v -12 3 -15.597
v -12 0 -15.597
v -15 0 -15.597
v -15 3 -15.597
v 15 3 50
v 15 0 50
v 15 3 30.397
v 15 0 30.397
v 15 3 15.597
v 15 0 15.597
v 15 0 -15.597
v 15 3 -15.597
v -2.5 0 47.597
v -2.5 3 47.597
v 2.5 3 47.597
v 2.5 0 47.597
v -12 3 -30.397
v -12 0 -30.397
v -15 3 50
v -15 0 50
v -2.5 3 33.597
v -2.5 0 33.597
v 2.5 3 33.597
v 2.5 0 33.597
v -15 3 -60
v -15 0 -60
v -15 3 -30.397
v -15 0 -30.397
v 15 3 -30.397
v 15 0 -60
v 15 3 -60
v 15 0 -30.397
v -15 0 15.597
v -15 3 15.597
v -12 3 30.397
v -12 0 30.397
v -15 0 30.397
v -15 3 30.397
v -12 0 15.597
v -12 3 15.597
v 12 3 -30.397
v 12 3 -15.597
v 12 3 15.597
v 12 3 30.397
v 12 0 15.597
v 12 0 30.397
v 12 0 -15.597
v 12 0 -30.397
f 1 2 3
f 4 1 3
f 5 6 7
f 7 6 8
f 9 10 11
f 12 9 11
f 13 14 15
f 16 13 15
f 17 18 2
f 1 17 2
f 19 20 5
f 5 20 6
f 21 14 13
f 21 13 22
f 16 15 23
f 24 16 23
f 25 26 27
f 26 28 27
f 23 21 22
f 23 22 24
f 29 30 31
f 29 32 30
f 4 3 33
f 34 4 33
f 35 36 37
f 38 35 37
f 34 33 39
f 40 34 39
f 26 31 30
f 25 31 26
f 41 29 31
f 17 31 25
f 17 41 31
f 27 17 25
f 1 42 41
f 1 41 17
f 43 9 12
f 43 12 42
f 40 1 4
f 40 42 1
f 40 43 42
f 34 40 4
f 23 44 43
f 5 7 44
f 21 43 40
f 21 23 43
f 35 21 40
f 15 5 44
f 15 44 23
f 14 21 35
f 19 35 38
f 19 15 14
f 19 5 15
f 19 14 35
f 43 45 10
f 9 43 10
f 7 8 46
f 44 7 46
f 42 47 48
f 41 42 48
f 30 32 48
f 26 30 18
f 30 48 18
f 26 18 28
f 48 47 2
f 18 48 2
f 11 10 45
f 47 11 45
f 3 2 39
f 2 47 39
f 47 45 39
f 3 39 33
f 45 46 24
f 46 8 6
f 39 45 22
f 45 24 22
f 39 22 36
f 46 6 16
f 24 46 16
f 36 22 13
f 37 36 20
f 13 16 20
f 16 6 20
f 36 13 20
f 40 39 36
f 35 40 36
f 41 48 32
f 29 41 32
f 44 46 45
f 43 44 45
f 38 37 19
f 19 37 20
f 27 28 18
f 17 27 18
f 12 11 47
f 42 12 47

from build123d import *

# Parameters (mm, degrees)
EXTRUDE_1_DEPTH     = 3
SKETCH_2_W          = 30
SKETCH_2_H          = 3
EXTRUDE_2_DEPTH     = 10
SKETCH_4_W          = 5
SKETCH_4_H          = 14
CUT_EXTRUDE_1_DEPTH = 10


with BuildPart() as part:
    # Эскиз1 → Бобышка-Вытянуть1 (new body)
    with BuildSketch(Plane(origin=(0, 0, 0), x_dir=(1, 0, 0), z_dir=(0, 1, 0))):
        Polygon((-15, -50), (15, -50), (15, -30.397249725), (12, -30.397249725), (12, -15.597249725), (15, -15.597249725), (15, 15.597249725), (12, 15.597249725), (12, 30.397249725), (15, 30.397249725), (15, 50), (-15, 50), (-15, 30.397249725), (-12, 30.397249725), (-12, 15.597249725), (-15, 15.597249725), (-15, -15.597249725), (-12, -15.597249725), (-12, -30.397249725), (-15, -30.397249725), align=None)
    extrude(amount=EXTRUDE_1_DEPTH)

    # Эскиз2 → Бобышка-Вытянуть2 (add)
    with BuildSketch(Plane(origin=(0, 0, -50), x_dir=(-1, 0, 0), z_dir=(0, 0, -1))):
        with Locations((0, 1.5)):
            Rectangle(SKETCH_2_W, SKETCH_2_H)
    extrude(amount=EXTRUDE_2_DEPTH)

    # Эскиз4 → Вырез-Вытянуть1 (cut)
    with BuildSketch(Plane(origin=(0, 3, 0), x_dir=(1, 0, 0), z_dir=(0, 1, 0))):
        with Locations((0, -40.597249725)):
            Rectangle(SKETCH_4_W, SKETCH_4_H)
    extrude(amount=-CUT_EXTRUDE_1_DEPTH, mode=Mode.SUBTRACT)


solid = part.part
